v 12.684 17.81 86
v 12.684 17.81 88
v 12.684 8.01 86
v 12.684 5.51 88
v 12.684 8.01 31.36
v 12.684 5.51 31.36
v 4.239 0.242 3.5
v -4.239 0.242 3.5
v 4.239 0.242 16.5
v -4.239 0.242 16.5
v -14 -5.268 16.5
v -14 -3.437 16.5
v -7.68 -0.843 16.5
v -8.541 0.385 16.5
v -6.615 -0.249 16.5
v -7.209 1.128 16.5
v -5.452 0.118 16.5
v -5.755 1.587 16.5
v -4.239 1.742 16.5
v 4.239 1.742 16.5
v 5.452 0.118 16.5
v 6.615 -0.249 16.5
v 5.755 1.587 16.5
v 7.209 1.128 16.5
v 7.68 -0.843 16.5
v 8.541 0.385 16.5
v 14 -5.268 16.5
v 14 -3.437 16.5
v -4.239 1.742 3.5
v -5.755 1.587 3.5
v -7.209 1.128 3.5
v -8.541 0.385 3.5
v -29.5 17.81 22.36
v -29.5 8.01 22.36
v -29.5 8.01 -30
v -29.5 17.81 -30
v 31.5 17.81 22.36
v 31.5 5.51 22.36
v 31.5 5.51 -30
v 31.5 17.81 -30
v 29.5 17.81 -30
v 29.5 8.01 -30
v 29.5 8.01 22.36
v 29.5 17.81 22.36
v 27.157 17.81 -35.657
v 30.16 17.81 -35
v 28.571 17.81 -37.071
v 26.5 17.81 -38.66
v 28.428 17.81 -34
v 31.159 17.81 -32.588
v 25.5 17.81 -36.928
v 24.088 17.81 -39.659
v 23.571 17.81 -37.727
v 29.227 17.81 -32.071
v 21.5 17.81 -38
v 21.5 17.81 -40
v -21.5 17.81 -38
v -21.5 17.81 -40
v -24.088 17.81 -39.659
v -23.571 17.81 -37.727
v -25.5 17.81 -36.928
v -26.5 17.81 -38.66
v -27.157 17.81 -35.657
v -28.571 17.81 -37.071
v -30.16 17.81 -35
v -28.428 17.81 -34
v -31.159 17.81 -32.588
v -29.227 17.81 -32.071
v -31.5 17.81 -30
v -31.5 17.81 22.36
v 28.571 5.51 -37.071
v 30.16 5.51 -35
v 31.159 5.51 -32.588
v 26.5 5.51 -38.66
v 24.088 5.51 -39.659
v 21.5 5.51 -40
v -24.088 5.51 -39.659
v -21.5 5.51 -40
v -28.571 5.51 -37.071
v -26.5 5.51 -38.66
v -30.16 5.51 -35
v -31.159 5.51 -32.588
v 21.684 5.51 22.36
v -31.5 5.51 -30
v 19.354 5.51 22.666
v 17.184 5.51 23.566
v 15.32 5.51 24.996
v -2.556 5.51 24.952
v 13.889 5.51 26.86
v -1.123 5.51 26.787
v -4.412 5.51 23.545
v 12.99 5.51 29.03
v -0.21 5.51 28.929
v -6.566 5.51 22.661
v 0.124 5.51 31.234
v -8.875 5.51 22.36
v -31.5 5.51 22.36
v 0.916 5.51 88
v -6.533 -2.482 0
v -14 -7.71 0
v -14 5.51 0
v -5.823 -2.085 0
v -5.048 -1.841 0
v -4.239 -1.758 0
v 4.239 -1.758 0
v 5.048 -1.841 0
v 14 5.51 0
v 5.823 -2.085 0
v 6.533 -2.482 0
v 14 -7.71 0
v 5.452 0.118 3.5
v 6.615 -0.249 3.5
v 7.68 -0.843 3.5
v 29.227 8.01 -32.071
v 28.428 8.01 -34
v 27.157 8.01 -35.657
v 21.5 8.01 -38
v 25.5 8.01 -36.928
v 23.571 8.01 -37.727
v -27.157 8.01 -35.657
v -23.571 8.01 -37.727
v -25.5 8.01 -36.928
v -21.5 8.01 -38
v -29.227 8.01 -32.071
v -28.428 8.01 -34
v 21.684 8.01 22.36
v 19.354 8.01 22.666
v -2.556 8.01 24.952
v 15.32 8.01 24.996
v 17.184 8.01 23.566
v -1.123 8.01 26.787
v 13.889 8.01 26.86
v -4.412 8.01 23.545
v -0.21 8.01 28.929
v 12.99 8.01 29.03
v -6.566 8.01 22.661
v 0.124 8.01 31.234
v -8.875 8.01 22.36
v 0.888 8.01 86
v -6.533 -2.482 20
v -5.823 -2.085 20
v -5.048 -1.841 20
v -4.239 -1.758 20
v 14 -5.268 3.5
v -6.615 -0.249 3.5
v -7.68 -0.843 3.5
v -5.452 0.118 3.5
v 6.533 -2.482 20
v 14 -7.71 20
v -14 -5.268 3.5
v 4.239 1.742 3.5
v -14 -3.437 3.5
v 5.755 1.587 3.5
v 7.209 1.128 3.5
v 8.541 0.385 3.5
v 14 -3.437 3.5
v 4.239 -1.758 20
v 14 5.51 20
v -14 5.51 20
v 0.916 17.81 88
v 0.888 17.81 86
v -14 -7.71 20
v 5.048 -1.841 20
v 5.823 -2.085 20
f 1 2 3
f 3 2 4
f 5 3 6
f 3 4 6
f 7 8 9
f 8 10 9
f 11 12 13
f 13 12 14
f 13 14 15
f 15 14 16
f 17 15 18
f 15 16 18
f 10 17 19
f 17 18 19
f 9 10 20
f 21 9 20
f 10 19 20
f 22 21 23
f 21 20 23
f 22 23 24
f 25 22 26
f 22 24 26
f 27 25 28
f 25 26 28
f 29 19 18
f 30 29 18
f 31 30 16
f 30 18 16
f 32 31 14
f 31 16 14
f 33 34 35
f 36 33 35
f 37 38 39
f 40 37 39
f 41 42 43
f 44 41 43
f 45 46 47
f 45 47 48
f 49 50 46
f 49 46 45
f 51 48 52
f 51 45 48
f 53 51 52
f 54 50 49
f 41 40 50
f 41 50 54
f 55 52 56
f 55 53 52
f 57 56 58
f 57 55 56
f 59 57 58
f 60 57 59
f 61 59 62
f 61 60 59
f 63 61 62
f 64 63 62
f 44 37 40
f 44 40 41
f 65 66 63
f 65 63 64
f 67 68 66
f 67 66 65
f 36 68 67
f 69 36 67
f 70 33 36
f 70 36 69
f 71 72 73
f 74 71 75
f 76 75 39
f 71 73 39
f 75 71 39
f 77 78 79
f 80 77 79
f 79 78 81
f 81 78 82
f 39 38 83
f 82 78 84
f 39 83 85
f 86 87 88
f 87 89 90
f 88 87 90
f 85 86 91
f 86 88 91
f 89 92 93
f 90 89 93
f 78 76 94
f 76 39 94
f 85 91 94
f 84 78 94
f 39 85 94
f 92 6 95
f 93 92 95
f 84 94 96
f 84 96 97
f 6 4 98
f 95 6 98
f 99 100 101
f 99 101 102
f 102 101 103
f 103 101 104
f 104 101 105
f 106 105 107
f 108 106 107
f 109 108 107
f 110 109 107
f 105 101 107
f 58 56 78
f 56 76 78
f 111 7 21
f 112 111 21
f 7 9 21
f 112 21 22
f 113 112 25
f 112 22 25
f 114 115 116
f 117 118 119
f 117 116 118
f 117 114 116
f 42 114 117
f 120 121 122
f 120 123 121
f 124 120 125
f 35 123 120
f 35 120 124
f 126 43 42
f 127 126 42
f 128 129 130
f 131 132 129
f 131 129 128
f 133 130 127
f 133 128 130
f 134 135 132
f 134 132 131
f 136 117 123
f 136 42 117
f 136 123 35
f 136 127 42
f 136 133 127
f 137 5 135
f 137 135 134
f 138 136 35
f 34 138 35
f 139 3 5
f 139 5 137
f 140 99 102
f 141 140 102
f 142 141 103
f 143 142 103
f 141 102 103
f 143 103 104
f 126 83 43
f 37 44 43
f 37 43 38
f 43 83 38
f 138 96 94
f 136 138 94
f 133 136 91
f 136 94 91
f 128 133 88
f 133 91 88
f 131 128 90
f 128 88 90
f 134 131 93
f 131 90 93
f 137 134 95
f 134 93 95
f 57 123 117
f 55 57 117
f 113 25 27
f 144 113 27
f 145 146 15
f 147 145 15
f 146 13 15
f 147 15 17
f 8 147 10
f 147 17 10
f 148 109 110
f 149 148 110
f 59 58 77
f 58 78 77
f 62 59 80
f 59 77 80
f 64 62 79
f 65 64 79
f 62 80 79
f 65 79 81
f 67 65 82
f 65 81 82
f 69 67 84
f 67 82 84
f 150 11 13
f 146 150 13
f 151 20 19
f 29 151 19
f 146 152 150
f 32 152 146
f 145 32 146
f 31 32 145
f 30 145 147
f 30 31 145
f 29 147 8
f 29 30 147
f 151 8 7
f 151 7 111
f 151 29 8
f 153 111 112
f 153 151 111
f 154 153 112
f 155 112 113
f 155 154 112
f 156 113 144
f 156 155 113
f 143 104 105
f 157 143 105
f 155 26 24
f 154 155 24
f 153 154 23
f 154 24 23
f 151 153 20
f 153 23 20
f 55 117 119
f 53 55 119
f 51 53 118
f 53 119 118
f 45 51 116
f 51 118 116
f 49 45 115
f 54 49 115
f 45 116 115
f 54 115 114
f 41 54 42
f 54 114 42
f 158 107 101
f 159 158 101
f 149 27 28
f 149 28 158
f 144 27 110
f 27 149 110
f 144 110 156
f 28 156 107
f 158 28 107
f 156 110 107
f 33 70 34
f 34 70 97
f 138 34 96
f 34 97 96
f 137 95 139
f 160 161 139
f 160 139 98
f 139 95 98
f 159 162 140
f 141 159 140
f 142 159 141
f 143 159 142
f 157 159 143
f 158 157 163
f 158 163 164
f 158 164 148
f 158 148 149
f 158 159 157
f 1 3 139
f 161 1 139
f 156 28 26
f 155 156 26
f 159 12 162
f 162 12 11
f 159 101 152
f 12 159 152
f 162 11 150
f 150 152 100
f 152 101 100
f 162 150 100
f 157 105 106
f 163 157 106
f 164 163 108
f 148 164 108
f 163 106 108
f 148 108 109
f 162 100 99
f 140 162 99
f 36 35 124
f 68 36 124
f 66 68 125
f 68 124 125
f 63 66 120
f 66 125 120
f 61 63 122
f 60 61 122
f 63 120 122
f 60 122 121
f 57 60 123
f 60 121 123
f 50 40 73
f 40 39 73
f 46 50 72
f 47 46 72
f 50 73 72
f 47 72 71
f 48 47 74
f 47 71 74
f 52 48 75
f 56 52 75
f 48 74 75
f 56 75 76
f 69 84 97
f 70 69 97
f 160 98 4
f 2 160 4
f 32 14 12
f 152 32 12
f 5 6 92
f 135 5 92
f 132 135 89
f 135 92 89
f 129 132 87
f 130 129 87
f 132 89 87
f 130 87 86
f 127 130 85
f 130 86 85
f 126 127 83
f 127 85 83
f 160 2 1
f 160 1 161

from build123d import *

# Parameters (mm, degrees)
F2_DEPTH  = 20
F4_DEPTH  = 6.5
F7_DEPTH  = 2.5
F9_DEPTH  = 9.8
F10_DEPTH = 25


with BuildPart() as f2:
    # F1 (on Top) → F2 (new body)
    with BuildSketch(Plane.XY):
        with BuildLine():
            Line((14, 5.510261), (-14, 5.510261))
            Line((-14, 5.510261), (-14, -7.709925))
            Line((-14, -7.709925), (-6.533111, -2.481553))
            ThreePointArc((-6.533111, -2.481553), (-5.441628, -1.943293), (-4.238805, -1.758161))
            Line((-4.238805, -1.758161), (4.238805, -1.758161))
            ThreePointArc((4.238805, -1.758161), (5.441628, -1.943293), (6.533111, -2.481553))
            Line((6.533111, -2.481553), (14, -7.709925))
            Line((14, -7.709925), (14, 5.510261))
        make_face()
    extrude(amount=F2_DEPTH)

    # F3 (on offset) → F4 (cut, symmetric)
    with BuildSketch(Plane.XY.offset(10)):
        with BuildLine():
            ThreePointArc((4.238805, 0.241839), (6.04304, -0.035859), (7.680263, -0.843249))
            Line((7.680263, -0.843249), (15.147153, -6.071621))
            Line((15.147153, -6.071621), (16.007518, -4.842893))
            Line((16.007518, -4.842893), (8.540628, 0.385479))
            ThreePointArc((8.540628, 0.385479), (6.494098, 1.394716), (4.238805, 1.741839))
            Line((4.238805, 1.741839), (-4.238805, 1.741839))
            ThreePointArc((-4.238805, 1.741839), (-6.494098, 1.394716), (-8.540628, 0.385479))
            Line((-8.540628, 0.385479), (-16.007518, -4.842893))
            Line((-16.007518, -4.842893), (-15.147153, -6.071621))
            Line((-15.147153, -6.071621), (-7.680263, -0.843249))
            ThreePointArc((-7.680263, -0.843249), (-6.04304, -0.035859), (-4.238805, 0.241839))
            Line((-4.238805, 0.241839), (4.238805, 0.241839))
        make_face()
    extrude(amount=F4_DEPTH, both=True, mode=Mode.SUBTRACT)


with BuildPart() as f7:
    # F5 (on face) → F7 (new body)
    with BuildSketch(Plane(origin=(0, 5.510261, 0), x_dir=(-1, 0, 0), z_dir=(0, 1, 0))):
        with BuildLine():
            Line((21.5, 88), (-21.5, 88))
            ThreePointArc((-21.5, 88), (-28.571068, 85.071068), (-31.5, 78))
            Line((-31.5, 78), (-31.5, -30))
            ThreePointArc((-31.5, -30), (-28.571068, -37.071068), (-21.5, -40))
            Line((-21.5, -40), (21.5, -40))
            ThreePointArc((21.5, -40), (28.571068, -37.071068), (31.5, -30))
            Line((31.5, -30), (31.5, 78))
            ThreePointArc((31.5, 78), (28.571068, 85.071068), (21.5, 88))
        make_face()
    extrude(amount=F7_DEPTH)

    # F8 (on face) → F9 (join)
    with BuildSketch(Plane(origin=(0, 8.010261, 0), x_dir=(-1, 0, 0), z_dir=(0, 1, 0))):
        with BuildLine():
            Line((-31.5, 78), (-31.5, -30))
            ThreePointArc((-31.5, -30), (-28.571068, -37.071068), (-21.5, -40))
            Line((-21.5, -40), (21.5, -40))
            ThreePointArc((21.5, -40), (28.571068, -37.071068), (31.5, -30))
            Line((31.5, -30), (31.5, 78))
            ThreePointArc((31.5, 78), (28.571068, 85.071068), (21.5, 88))
            Line((21.5, 88), (-21.5, 88))
            ThreePointArc((-21.5, 88), (-28.571068, 85.071068), (-31.5, 78))
        make_face()
        with BuildLine():
            Line((-29.5, -30), (-29.5, 78))
            ThreePointArc((-29.5, 78), (-27.156854, 83.656854), (-21.5, 86))
            Line((-21.5, 86), (21.5, 86))
            ThreePointArc((21.5, 86), (27.156854, 83.656854), (29.5, 78))
            Line((29.5, 78), (29.5, -30))
            ThreePointArc((29.5, -30), (27.156854, -35.656854), (21.5, -38))
            Line((21.5, -38), (-21.5, -38))
            ThreePointArc((-21.5, -38), (-27.156854, -35.656854), (-29.5, -30))
        make_face(mode=Mode.SUBTRACT)
    extrude(amount=F9_DEPTH)

    # F6 (on Front) → F10 (cut)
    with BuildSketch(Plane.XZ):
        with BuildLine():
            ThreePointArc((12.683653, 31.359739), (15.319692, 24.995778), (21.683653, 22.359739))
            Line((21.683653, 22.359739), (32.072476, 22.359739))
            Line((32.072476, 22.359739), (32.072476, 102.717368))
            Line((32.072476, 102.717368), (12.683653, 102.82569))
            Line((12.683653, 102.82569), (12.683653, 31.359739))
        make_face()
        with BuildLine():
            Line((0.123888, 31.234109), (1.123324, 102.82569))
            Line((1.123324, 102.82569), (-38.69006, 102.82569))
            Line((-38.69006, 102.82569), (-38.69006, 22.359739))
            Line((-38.69006, 22.359739), (-8.875235, 22.359739))
            ThreePointArc((-8.875235, 22.359739), (-2.555847, 24.951515), (0.123888, 31.234109))
        make_face()
    extrude(amount=-F10_DEPTH, mode=Mode.SUBTRACT)


solid = Compound([f2.part, f7.part])
